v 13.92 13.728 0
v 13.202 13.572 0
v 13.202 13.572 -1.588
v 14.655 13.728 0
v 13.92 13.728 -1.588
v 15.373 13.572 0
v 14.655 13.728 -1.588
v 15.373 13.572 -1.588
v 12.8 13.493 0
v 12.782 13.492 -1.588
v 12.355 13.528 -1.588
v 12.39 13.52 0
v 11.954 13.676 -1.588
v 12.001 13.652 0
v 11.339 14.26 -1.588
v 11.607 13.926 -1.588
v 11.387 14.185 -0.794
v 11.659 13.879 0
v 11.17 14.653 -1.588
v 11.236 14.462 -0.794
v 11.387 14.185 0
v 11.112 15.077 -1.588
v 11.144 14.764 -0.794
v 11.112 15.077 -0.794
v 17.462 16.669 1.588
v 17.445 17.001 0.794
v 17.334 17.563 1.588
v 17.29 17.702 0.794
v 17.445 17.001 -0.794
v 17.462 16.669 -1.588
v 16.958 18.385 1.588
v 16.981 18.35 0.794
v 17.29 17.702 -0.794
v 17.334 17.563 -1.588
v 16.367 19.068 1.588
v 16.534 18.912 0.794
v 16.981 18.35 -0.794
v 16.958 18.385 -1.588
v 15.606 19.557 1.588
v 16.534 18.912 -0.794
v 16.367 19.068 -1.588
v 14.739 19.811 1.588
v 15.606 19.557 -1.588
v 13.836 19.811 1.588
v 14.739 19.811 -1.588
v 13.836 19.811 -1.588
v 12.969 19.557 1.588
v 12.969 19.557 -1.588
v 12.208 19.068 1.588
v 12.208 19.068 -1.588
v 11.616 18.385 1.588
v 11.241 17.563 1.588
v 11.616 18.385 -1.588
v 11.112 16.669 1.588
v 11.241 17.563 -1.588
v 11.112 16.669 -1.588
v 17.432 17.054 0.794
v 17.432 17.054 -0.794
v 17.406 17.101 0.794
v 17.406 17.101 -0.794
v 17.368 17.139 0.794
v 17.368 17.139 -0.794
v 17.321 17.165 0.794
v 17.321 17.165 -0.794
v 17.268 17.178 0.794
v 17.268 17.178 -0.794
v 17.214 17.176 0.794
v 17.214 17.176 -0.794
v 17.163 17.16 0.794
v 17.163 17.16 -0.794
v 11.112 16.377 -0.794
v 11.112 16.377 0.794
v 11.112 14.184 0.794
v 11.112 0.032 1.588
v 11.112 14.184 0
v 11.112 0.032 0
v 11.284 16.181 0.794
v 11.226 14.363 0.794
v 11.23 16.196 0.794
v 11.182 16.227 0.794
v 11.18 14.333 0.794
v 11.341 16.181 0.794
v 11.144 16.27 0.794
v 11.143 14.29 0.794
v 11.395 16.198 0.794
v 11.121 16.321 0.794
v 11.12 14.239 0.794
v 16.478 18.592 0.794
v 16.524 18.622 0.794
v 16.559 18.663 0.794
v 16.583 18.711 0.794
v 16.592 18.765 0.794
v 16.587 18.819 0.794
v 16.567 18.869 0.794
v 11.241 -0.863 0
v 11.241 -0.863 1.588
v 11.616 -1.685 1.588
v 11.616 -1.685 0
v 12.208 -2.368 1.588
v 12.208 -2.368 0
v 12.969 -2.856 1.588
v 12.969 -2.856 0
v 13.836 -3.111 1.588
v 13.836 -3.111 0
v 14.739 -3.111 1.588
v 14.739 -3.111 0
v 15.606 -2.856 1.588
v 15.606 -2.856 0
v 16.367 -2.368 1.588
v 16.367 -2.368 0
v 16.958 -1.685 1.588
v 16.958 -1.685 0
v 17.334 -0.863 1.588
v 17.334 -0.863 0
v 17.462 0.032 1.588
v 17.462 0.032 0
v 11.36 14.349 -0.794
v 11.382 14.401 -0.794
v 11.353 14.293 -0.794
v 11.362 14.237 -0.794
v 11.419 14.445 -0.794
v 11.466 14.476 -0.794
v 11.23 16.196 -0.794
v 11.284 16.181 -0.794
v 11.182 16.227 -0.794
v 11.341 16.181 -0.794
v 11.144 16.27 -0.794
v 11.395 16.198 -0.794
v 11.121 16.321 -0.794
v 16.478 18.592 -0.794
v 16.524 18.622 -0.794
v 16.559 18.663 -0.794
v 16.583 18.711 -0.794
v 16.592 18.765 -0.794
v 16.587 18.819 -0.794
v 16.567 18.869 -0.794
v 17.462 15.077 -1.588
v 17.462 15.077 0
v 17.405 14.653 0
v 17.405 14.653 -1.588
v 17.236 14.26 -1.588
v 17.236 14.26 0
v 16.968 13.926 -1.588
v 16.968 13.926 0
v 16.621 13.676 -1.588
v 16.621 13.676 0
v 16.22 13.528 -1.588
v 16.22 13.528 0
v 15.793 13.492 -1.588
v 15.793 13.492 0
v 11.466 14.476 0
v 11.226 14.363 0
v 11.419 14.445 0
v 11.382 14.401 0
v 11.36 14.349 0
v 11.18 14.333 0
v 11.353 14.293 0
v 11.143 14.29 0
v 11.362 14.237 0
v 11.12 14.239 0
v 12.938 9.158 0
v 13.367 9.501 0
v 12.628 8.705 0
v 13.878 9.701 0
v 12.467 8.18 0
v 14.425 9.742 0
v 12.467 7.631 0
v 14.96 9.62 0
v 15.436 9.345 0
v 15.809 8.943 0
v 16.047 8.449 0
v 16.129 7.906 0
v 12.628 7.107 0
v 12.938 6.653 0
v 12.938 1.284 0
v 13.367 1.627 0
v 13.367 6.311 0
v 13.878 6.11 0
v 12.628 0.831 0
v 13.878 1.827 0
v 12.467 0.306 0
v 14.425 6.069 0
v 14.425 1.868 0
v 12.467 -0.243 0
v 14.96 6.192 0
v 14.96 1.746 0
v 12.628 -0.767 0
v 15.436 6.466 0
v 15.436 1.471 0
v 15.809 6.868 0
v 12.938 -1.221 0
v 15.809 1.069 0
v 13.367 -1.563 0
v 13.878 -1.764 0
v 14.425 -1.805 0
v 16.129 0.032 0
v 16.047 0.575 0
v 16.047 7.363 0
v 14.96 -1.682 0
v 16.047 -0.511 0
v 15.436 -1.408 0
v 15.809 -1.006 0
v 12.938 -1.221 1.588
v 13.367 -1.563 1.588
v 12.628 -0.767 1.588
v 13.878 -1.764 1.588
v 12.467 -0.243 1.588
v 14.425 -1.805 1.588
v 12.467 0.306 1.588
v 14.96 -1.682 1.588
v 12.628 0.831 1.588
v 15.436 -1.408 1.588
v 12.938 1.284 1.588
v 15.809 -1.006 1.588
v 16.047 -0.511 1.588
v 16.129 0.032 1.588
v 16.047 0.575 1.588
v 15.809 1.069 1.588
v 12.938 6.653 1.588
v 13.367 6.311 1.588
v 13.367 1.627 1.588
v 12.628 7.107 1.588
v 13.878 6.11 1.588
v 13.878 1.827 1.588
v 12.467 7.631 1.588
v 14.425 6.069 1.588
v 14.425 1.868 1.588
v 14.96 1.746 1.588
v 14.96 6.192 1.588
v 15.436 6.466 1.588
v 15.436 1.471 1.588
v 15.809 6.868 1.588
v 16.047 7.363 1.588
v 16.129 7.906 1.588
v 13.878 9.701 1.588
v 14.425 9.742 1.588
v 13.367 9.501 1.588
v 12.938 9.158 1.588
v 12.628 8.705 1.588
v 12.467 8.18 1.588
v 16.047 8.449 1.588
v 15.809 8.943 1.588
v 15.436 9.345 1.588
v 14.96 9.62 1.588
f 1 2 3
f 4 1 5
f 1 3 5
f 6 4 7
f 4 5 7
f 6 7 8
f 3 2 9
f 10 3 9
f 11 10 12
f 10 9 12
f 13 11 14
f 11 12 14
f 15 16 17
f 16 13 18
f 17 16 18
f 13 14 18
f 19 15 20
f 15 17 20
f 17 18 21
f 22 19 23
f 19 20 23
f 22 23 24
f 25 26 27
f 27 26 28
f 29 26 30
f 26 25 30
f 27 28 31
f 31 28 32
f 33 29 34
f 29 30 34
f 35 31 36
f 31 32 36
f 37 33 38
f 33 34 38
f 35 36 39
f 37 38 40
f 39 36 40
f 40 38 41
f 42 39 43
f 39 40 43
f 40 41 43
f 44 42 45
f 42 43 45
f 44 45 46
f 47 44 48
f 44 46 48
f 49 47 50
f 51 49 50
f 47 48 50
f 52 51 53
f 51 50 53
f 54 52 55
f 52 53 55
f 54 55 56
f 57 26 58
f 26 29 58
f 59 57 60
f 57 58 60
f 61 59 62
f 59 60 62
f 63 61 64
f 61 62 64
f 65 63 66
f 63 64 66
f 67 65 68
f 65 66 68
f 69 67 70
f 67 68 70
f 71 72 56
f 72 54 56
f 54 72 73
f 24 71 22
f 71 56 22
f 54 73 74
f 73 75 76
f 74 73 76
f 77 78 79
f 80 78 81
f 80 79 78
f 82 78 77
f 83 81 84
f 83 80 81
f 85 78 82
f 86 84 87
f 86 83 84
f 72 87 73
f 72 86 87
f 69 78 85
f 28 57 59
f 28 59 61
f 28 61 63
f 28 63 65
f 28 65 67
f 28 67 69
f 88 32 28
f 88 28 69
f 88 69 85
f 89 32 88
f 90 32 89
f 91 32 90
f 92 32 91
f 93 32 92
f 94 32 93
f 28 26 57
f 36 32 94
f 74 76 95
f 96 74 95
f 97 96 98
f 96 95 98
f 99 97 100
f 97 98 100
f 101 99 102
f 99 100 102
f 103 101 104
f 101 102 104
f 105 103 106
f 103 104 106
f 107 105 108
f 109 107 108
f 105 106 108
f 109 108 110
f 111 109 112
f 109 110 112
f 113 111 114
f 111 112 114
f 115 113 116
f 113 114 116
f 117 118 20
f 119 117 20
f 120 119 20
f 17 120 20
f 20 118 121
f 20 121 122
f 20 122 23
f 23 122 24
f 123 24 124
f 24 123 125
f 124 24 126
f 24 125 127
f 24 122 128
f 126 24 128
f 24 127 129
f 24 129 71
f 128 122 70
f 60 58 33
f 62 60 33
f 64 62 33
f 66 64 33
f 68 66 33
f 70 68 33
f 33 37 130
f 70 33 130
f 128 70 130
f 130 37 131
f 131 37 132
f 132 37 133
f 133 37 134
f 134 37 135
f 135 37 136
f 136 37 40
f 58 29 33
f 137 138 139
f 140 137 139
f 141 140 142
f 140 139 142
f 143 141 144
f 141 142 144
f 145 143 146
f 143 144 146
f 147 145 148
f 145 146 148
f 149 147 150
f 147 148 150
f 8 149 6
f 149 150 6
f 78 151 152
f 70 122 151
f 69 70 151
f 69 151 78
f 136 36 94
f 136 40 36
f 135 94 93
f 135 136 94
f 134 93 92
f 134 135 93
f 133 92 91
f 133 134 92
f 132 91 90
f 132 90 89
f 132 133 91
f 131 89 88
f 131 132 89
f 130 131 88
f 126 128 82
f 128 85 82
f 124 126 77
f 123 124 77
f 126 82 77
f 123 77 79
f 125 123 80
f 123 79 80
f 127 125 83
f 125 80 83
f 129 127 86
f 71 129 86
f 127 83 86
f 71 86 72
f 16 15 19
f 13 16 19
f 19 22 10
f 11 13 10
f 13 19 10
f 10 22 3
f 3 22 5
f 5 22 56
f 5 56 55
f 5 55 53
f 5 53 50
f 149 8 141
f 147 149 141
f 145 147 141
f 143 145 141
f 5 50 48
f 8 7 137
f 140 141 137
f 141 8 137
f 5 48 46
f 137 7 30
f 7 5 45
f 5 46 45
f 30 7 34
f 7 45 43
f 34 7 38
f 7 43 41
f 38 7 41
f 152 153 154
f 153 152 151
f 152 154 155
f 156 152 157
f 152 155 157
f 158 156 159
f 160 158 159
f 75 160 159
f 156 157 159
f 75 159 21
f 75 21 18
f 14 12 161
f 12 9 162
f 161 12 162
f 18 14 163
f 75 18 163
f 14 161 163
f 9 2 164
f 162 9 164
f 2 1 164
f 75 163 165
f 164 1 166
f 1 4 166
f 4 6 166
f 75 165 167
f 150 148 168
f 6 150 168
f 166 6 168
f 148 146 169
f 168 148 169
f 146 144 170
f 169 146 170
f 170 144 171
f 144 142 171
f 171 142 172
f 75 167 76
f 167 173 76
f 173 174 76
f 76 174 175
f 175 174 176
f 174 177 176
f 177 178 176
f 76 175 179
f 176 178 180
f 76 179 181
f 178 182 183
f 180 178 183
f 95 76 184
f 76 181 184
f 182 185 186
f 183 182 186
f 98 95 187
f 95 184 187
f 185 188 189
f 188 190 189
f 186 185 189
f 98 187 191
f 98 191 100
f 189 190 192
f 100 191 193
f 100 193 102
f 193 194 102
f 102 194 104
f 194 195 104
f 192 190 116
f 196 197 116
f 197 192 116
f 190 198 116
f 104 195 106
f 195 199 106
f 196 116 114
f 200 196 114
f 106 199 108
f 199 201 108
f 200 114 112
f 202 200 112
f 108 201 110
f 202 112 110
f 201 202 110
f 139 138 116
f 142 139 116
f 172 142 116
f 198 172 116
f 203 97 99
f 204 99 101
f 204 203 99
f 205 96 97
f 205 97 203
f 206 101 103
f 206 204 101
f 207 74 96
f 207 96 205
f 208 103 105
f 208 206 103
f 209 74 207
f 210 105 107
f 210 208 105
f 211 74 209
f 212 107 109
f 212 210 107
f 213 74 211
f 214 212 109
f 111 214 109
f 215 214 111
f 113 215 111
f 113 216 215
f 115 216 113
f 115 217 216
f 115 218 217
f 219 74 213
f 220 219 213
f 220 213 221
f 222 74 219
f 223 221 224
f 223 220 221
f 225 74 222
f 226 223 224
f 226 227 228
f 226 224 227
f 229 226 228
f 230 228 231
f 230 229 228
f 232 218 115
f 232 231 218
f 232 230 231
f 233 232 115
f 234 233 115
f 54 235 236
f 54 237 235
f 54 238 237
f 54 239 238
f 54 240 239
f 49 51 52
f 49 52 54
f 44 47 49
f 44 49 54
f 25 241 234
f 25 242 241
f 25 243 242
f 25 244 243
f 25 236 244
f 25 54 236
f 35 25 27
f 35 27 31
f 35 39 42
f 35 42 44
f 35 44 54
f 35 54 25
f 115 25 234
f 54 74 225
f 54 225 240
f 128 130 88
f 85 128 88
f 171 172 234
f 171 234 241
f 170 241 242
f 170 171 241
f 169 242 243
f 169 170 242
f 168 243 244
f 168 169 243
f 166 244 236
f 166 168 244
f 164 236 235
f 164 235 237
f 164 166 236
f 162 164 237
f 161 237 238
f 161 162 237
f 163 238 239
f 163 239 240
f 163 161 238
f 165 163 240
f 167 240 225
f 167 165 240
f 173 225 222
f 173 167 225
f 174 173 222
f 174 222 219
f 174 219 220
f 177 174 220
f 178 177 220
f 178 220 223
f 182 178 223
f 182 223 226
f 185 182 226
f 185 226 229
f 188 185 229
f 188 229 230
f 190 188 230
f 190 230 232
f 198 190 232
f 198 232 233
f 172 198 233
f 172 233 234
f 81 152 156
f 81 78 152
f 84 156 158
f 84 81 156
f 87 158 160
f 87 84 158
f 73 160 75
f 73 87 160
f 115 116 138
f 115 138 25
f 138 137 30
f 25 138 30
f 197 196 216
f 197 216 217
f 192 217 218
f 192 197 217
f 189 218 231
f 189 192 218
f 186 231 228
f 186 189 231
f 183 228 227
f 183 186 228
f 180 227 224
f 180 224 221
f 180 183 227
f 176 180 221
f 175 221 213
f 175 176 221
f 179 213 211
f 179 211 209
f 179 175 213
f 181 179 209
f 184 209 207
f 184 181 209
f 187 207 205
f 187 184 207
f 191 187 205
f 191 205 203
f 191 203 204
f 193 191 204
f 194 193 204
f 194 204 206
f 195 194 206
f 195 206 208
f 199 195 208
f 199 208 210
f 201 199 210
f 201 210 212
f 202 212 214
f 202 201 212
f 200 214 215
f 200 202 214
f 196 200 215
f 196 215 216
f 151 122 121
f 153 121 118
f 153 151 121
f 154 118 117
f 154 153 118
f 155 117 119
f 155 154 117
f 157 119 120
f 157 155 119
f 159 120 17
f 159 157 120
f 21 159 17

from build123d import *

# Parameters (mm, degrees)
SKETCH3_R               = 1.8414999999999992
SKETCH3_R_2             = 1.8415000000000015
BOSS_EXTRUDE1_DEPTH     = 1.5875
BOSS_EXTRUDE2_START     = -1.5875
SKETCH3_3_R             = 3.1750000000000016
BOSS_EXTRUDE2_DEPTH     = 1.5875
CUT_EXTRUDE1_DEPTH      = 1.5875
CUT_EXTRUDE3_DEPTH      = 14.458066723062892
CUT_EXTRUDE3_DEPTH_BACK = 14.458066723062892
SKETCH9_W               = 1.5874999999999995
SKETCH9_H               = 1.5875000000000021
FILLET1_R               = 1.5875
FILLET3_R               = 0.19845020000000002


with BuildPart() as part:
    # Sketch3 → Boss-Extrude1 (new body)
    with BuildSketch(Plane.XY):
        with BuildLine():
            ThreePointArc((11.11246472217867, 0.03175000000000093), (14.287464722178669, -3.1432499999999988), (17.46246472217867, 0.03174999999999976))
            Line((17.46246472217867, 0.03175000000000054), (17.46246472217867, 16.668750000000003))
            ThreePointArc((17.46246472217867, 16.668750000000003), (14.287464722178667, 19.843750000000004), (11.112464722178665, 16.668750000000003))
            Line((11.112464722178666, 16.668750000000003), (11.11246472217867, 0.03174999999999883))
        make_face()
        with Locations((14.287464722178665, 7.905750000000001)):
            Circle(SKETCH3_R, mode=Mode.SUBTRACT)
        with Locations((14.287464722178669, 0.03175000000000054)):
            Circle(SKETCH3_R_2, mode=Mode.SUBTRACT)
    extrude(amount=BOSS_EXTRUDE1_DEPTH)

    # Sketch3<3> → Boss-Extrude2 (add)
    with BuildSketch(Plane.XY.offset(BOSS_EXTRUDE2_START)):
        with BuildLine():
            Line((14.287464727919362, 13.493750000000004), (17.46246472217867, 13.493750000000004))
            Line((17.46246472217867, 13.493750000000004), (17.46246472217867, 16.668750000000003))
            ThreePointArc((17.46246472217867, 16.668750000000003), (16.5325287544756, 14.423685971762355), (14.287464727919362, 13.493750000000002))
        make_face()
        with BuildLine():
            Line((11.11246472217867, 13.493750000000004), (14.287464727919362, 13.493750000000004))
            ThreePointArc((14.287464727919362, 13.493750000000002), (12.042400693941019, 14.423685967703072), (11.112464722178665, 16.668750000000003))
            Line((11.112464722178666, 16.668750000000003), (11.11246472217867, 13.493750000000004))
        make_face()
        with Locations((14.287464722178667, 16.668750000000003)):
            Circle(SKETCH3_3_R)
        with BuildLine():
            ThreePointArc((11.112464722178665, 10.318750009292732), (12.042400697226496, 12.56381403558241), (14.287464727919362, 13.493750000000002))
            Line((14.287464727919362, 13.493750000000004), (11.11246472217867, 13.493750000000004))
            Line((11.11246472217867, 13.493750000000004), (11.11246472217867, 10.318750009292732))
        make_face()
        with BuildLine():
            ThreePointArc((14.287464727919362, 13.493750000000002), (16.532528754475596, 12.563814028237648), (17.462464722178666, 10.318750000000003))
            Line((17.46246472217867, 10.318750000000003), (17.46246472217867, 13.493750000000004))
            Line((17.46246472217867, 13.493750000000004), (14.287464727919362, 13.493750000000004))
        make_face()
    extrude(amount=BOSS_EXTRUDE2_DEPTH)

    # Sketch4 → Cut-Extrude1 (cut)
    with BuildSketch(Plane(origin=(0, 0, -1.5875), x_dir=(-1, 0, 0), z_dir=(0, 0, -1))):
        with BuildLine():
            ThreePointArc((-11.366464722178668, 12.114801224213839), (-14.28746472217867, 13.747750000000003), (-17.208464722178668, 12.11480122421383))
            ThreePointArc((-17.208464722178668, 12.11480122421383), (-17.345736990888724, 11.869560023967814), (-17.4624647221787, 11.613900956452488))
            Line((-17.46246472217867, 11.613900956452483), (-17.46246472217867, 10.318750000000003))
            ThreePointArc((-17.46246472217867, 10.318750000000005), (-14.287464722178669, 13.493750000000002), (-11.112464722178668, 10.318750000000003))
            Line((-11.112464722178666, 10.318750000000003), (-11.112464722178666, 11.613900956452593))
            ThreePointArc((-11.112464722178673, 11.613900956452591), (-11.229192453468636, 11.86956002396787), (-11.366464722178668, 12.114801224213839))
        make_face()
        with BuildLine():
            Line((-17.46246472217867, 10.318750000000003), (-17.46246472217867, 11.613900956452483))
            ThreePointArc((-17.4624647221787, 11.613900956452488), (-14.947376079862362, 6.9538491099290844), (-10.858464722178665, 10.318750000000003))
            ThreePointArc((-10.858464722178665, 10.318750000000003), (-10.922563832107757, 10.978661357683757), (-11.112464722178673, 11.613900956452591))
            Line((-11.112464722178666, 11.613900956452593), (-11.112464722178666, 10.318750000000003))
            ThreePointArc((-11.112464722178668, 10.318750000000003), (-14.287464722178669, 13.493750000000002), (-17.46246472217867, 10.318750000000005))
        make_face()
    extrude(amount=-CUT_EXTRUDE1_DEPTH, mode=Mode.SUBTRACT)

    # Sketch9 → Cut-Extrude3 (cut, two sides: drawn at the far end of the back side and taken through both)
    with BuildSketch(Plane(origin=(14.949330355898779, 7.042270953374606, 0), x_dir=(0, 0, 1), z_dir=(-0.9046486230783365, -0.42615826726988393, 0)).offset(-CUT_EXTRUDE3_DEPTH_BACK)):
        with Locations((-1.1e-16, 9.003381908558007)):
            Rectangle(SKETCH9_W, SKETCH9_H)
    extrude(amount=CUT_EXTRUDE3_DEPTH + CUT_EXTRUDE3_DEPTH_BACK, mode=Mode.SUBTRACT)

    # Fillet1
    # the kernel refuses this fillet: 1.5875 mm, written as the material it takes off along each edge
    with BuildSketch(Plane(origin=(11.112464722178668, 11.613900956452579, 0), x_dir=(-5.1e-16, 1, 0), z_dir=(0, 0, -1))) as fillet1_piece_1:
        with BuildLine():
            CenterArc((3.463537518327043, 1.5875000000000004), FILLET1_R, 161.5512847696779, 108.44871523032214)
            ThreePointArc((1.9576234440297167, 2.0898734177215426), (1.2074075320922062, 0.8308067461464439), (0, 0))
            Line((0, 0), (3.463537518327044, 0))
        make_face()
    extrude(amount=10.24634379581761, mode=Mode.SUBTRACT)
    with BuildSketch(Plane(origin=(17.46246472217867, 11.613900956453127, 0), x_dir=(0, 1, 0), z_dir=(0, 0, -1))) as fillet1_piece_2:
        with BuildLine():
            CenterArc((3.4635375183265698, -1.5875000000000004), FILLET1_R, 90, 108.44871523031935)
            ThreePointArc((1.9576234440292186, -2.0898734177214706), (1.2074075320919153, -0.8308067461464965), (0, 0))
            Line((0, 0), (3.4635375183265698, 0))
        make_face()
    extrude(amount=10.246343795816424, mode=Mode.SUBTRACT)

    # Fillet3
    fillet3_edges = [part.edges().sort_by_distance(p)[0] for p in [
        (16.72182330744723, 18.70701477139974, -1.1e-16),
        (17.404301856828425, 17.273689068062478, -1.1e-16),
        (11.112464722178666, 14.309755511050398, 0.3968749999999998),
        (11.112464722178666, 16.064580488949616, -1.1e-16),
        (11.271579474224783, 14.38471065418466, -0.3968749999999999),
    ]]
    fillet(fillet3_edges, radius=FILLET3_R)


solid = part.part
